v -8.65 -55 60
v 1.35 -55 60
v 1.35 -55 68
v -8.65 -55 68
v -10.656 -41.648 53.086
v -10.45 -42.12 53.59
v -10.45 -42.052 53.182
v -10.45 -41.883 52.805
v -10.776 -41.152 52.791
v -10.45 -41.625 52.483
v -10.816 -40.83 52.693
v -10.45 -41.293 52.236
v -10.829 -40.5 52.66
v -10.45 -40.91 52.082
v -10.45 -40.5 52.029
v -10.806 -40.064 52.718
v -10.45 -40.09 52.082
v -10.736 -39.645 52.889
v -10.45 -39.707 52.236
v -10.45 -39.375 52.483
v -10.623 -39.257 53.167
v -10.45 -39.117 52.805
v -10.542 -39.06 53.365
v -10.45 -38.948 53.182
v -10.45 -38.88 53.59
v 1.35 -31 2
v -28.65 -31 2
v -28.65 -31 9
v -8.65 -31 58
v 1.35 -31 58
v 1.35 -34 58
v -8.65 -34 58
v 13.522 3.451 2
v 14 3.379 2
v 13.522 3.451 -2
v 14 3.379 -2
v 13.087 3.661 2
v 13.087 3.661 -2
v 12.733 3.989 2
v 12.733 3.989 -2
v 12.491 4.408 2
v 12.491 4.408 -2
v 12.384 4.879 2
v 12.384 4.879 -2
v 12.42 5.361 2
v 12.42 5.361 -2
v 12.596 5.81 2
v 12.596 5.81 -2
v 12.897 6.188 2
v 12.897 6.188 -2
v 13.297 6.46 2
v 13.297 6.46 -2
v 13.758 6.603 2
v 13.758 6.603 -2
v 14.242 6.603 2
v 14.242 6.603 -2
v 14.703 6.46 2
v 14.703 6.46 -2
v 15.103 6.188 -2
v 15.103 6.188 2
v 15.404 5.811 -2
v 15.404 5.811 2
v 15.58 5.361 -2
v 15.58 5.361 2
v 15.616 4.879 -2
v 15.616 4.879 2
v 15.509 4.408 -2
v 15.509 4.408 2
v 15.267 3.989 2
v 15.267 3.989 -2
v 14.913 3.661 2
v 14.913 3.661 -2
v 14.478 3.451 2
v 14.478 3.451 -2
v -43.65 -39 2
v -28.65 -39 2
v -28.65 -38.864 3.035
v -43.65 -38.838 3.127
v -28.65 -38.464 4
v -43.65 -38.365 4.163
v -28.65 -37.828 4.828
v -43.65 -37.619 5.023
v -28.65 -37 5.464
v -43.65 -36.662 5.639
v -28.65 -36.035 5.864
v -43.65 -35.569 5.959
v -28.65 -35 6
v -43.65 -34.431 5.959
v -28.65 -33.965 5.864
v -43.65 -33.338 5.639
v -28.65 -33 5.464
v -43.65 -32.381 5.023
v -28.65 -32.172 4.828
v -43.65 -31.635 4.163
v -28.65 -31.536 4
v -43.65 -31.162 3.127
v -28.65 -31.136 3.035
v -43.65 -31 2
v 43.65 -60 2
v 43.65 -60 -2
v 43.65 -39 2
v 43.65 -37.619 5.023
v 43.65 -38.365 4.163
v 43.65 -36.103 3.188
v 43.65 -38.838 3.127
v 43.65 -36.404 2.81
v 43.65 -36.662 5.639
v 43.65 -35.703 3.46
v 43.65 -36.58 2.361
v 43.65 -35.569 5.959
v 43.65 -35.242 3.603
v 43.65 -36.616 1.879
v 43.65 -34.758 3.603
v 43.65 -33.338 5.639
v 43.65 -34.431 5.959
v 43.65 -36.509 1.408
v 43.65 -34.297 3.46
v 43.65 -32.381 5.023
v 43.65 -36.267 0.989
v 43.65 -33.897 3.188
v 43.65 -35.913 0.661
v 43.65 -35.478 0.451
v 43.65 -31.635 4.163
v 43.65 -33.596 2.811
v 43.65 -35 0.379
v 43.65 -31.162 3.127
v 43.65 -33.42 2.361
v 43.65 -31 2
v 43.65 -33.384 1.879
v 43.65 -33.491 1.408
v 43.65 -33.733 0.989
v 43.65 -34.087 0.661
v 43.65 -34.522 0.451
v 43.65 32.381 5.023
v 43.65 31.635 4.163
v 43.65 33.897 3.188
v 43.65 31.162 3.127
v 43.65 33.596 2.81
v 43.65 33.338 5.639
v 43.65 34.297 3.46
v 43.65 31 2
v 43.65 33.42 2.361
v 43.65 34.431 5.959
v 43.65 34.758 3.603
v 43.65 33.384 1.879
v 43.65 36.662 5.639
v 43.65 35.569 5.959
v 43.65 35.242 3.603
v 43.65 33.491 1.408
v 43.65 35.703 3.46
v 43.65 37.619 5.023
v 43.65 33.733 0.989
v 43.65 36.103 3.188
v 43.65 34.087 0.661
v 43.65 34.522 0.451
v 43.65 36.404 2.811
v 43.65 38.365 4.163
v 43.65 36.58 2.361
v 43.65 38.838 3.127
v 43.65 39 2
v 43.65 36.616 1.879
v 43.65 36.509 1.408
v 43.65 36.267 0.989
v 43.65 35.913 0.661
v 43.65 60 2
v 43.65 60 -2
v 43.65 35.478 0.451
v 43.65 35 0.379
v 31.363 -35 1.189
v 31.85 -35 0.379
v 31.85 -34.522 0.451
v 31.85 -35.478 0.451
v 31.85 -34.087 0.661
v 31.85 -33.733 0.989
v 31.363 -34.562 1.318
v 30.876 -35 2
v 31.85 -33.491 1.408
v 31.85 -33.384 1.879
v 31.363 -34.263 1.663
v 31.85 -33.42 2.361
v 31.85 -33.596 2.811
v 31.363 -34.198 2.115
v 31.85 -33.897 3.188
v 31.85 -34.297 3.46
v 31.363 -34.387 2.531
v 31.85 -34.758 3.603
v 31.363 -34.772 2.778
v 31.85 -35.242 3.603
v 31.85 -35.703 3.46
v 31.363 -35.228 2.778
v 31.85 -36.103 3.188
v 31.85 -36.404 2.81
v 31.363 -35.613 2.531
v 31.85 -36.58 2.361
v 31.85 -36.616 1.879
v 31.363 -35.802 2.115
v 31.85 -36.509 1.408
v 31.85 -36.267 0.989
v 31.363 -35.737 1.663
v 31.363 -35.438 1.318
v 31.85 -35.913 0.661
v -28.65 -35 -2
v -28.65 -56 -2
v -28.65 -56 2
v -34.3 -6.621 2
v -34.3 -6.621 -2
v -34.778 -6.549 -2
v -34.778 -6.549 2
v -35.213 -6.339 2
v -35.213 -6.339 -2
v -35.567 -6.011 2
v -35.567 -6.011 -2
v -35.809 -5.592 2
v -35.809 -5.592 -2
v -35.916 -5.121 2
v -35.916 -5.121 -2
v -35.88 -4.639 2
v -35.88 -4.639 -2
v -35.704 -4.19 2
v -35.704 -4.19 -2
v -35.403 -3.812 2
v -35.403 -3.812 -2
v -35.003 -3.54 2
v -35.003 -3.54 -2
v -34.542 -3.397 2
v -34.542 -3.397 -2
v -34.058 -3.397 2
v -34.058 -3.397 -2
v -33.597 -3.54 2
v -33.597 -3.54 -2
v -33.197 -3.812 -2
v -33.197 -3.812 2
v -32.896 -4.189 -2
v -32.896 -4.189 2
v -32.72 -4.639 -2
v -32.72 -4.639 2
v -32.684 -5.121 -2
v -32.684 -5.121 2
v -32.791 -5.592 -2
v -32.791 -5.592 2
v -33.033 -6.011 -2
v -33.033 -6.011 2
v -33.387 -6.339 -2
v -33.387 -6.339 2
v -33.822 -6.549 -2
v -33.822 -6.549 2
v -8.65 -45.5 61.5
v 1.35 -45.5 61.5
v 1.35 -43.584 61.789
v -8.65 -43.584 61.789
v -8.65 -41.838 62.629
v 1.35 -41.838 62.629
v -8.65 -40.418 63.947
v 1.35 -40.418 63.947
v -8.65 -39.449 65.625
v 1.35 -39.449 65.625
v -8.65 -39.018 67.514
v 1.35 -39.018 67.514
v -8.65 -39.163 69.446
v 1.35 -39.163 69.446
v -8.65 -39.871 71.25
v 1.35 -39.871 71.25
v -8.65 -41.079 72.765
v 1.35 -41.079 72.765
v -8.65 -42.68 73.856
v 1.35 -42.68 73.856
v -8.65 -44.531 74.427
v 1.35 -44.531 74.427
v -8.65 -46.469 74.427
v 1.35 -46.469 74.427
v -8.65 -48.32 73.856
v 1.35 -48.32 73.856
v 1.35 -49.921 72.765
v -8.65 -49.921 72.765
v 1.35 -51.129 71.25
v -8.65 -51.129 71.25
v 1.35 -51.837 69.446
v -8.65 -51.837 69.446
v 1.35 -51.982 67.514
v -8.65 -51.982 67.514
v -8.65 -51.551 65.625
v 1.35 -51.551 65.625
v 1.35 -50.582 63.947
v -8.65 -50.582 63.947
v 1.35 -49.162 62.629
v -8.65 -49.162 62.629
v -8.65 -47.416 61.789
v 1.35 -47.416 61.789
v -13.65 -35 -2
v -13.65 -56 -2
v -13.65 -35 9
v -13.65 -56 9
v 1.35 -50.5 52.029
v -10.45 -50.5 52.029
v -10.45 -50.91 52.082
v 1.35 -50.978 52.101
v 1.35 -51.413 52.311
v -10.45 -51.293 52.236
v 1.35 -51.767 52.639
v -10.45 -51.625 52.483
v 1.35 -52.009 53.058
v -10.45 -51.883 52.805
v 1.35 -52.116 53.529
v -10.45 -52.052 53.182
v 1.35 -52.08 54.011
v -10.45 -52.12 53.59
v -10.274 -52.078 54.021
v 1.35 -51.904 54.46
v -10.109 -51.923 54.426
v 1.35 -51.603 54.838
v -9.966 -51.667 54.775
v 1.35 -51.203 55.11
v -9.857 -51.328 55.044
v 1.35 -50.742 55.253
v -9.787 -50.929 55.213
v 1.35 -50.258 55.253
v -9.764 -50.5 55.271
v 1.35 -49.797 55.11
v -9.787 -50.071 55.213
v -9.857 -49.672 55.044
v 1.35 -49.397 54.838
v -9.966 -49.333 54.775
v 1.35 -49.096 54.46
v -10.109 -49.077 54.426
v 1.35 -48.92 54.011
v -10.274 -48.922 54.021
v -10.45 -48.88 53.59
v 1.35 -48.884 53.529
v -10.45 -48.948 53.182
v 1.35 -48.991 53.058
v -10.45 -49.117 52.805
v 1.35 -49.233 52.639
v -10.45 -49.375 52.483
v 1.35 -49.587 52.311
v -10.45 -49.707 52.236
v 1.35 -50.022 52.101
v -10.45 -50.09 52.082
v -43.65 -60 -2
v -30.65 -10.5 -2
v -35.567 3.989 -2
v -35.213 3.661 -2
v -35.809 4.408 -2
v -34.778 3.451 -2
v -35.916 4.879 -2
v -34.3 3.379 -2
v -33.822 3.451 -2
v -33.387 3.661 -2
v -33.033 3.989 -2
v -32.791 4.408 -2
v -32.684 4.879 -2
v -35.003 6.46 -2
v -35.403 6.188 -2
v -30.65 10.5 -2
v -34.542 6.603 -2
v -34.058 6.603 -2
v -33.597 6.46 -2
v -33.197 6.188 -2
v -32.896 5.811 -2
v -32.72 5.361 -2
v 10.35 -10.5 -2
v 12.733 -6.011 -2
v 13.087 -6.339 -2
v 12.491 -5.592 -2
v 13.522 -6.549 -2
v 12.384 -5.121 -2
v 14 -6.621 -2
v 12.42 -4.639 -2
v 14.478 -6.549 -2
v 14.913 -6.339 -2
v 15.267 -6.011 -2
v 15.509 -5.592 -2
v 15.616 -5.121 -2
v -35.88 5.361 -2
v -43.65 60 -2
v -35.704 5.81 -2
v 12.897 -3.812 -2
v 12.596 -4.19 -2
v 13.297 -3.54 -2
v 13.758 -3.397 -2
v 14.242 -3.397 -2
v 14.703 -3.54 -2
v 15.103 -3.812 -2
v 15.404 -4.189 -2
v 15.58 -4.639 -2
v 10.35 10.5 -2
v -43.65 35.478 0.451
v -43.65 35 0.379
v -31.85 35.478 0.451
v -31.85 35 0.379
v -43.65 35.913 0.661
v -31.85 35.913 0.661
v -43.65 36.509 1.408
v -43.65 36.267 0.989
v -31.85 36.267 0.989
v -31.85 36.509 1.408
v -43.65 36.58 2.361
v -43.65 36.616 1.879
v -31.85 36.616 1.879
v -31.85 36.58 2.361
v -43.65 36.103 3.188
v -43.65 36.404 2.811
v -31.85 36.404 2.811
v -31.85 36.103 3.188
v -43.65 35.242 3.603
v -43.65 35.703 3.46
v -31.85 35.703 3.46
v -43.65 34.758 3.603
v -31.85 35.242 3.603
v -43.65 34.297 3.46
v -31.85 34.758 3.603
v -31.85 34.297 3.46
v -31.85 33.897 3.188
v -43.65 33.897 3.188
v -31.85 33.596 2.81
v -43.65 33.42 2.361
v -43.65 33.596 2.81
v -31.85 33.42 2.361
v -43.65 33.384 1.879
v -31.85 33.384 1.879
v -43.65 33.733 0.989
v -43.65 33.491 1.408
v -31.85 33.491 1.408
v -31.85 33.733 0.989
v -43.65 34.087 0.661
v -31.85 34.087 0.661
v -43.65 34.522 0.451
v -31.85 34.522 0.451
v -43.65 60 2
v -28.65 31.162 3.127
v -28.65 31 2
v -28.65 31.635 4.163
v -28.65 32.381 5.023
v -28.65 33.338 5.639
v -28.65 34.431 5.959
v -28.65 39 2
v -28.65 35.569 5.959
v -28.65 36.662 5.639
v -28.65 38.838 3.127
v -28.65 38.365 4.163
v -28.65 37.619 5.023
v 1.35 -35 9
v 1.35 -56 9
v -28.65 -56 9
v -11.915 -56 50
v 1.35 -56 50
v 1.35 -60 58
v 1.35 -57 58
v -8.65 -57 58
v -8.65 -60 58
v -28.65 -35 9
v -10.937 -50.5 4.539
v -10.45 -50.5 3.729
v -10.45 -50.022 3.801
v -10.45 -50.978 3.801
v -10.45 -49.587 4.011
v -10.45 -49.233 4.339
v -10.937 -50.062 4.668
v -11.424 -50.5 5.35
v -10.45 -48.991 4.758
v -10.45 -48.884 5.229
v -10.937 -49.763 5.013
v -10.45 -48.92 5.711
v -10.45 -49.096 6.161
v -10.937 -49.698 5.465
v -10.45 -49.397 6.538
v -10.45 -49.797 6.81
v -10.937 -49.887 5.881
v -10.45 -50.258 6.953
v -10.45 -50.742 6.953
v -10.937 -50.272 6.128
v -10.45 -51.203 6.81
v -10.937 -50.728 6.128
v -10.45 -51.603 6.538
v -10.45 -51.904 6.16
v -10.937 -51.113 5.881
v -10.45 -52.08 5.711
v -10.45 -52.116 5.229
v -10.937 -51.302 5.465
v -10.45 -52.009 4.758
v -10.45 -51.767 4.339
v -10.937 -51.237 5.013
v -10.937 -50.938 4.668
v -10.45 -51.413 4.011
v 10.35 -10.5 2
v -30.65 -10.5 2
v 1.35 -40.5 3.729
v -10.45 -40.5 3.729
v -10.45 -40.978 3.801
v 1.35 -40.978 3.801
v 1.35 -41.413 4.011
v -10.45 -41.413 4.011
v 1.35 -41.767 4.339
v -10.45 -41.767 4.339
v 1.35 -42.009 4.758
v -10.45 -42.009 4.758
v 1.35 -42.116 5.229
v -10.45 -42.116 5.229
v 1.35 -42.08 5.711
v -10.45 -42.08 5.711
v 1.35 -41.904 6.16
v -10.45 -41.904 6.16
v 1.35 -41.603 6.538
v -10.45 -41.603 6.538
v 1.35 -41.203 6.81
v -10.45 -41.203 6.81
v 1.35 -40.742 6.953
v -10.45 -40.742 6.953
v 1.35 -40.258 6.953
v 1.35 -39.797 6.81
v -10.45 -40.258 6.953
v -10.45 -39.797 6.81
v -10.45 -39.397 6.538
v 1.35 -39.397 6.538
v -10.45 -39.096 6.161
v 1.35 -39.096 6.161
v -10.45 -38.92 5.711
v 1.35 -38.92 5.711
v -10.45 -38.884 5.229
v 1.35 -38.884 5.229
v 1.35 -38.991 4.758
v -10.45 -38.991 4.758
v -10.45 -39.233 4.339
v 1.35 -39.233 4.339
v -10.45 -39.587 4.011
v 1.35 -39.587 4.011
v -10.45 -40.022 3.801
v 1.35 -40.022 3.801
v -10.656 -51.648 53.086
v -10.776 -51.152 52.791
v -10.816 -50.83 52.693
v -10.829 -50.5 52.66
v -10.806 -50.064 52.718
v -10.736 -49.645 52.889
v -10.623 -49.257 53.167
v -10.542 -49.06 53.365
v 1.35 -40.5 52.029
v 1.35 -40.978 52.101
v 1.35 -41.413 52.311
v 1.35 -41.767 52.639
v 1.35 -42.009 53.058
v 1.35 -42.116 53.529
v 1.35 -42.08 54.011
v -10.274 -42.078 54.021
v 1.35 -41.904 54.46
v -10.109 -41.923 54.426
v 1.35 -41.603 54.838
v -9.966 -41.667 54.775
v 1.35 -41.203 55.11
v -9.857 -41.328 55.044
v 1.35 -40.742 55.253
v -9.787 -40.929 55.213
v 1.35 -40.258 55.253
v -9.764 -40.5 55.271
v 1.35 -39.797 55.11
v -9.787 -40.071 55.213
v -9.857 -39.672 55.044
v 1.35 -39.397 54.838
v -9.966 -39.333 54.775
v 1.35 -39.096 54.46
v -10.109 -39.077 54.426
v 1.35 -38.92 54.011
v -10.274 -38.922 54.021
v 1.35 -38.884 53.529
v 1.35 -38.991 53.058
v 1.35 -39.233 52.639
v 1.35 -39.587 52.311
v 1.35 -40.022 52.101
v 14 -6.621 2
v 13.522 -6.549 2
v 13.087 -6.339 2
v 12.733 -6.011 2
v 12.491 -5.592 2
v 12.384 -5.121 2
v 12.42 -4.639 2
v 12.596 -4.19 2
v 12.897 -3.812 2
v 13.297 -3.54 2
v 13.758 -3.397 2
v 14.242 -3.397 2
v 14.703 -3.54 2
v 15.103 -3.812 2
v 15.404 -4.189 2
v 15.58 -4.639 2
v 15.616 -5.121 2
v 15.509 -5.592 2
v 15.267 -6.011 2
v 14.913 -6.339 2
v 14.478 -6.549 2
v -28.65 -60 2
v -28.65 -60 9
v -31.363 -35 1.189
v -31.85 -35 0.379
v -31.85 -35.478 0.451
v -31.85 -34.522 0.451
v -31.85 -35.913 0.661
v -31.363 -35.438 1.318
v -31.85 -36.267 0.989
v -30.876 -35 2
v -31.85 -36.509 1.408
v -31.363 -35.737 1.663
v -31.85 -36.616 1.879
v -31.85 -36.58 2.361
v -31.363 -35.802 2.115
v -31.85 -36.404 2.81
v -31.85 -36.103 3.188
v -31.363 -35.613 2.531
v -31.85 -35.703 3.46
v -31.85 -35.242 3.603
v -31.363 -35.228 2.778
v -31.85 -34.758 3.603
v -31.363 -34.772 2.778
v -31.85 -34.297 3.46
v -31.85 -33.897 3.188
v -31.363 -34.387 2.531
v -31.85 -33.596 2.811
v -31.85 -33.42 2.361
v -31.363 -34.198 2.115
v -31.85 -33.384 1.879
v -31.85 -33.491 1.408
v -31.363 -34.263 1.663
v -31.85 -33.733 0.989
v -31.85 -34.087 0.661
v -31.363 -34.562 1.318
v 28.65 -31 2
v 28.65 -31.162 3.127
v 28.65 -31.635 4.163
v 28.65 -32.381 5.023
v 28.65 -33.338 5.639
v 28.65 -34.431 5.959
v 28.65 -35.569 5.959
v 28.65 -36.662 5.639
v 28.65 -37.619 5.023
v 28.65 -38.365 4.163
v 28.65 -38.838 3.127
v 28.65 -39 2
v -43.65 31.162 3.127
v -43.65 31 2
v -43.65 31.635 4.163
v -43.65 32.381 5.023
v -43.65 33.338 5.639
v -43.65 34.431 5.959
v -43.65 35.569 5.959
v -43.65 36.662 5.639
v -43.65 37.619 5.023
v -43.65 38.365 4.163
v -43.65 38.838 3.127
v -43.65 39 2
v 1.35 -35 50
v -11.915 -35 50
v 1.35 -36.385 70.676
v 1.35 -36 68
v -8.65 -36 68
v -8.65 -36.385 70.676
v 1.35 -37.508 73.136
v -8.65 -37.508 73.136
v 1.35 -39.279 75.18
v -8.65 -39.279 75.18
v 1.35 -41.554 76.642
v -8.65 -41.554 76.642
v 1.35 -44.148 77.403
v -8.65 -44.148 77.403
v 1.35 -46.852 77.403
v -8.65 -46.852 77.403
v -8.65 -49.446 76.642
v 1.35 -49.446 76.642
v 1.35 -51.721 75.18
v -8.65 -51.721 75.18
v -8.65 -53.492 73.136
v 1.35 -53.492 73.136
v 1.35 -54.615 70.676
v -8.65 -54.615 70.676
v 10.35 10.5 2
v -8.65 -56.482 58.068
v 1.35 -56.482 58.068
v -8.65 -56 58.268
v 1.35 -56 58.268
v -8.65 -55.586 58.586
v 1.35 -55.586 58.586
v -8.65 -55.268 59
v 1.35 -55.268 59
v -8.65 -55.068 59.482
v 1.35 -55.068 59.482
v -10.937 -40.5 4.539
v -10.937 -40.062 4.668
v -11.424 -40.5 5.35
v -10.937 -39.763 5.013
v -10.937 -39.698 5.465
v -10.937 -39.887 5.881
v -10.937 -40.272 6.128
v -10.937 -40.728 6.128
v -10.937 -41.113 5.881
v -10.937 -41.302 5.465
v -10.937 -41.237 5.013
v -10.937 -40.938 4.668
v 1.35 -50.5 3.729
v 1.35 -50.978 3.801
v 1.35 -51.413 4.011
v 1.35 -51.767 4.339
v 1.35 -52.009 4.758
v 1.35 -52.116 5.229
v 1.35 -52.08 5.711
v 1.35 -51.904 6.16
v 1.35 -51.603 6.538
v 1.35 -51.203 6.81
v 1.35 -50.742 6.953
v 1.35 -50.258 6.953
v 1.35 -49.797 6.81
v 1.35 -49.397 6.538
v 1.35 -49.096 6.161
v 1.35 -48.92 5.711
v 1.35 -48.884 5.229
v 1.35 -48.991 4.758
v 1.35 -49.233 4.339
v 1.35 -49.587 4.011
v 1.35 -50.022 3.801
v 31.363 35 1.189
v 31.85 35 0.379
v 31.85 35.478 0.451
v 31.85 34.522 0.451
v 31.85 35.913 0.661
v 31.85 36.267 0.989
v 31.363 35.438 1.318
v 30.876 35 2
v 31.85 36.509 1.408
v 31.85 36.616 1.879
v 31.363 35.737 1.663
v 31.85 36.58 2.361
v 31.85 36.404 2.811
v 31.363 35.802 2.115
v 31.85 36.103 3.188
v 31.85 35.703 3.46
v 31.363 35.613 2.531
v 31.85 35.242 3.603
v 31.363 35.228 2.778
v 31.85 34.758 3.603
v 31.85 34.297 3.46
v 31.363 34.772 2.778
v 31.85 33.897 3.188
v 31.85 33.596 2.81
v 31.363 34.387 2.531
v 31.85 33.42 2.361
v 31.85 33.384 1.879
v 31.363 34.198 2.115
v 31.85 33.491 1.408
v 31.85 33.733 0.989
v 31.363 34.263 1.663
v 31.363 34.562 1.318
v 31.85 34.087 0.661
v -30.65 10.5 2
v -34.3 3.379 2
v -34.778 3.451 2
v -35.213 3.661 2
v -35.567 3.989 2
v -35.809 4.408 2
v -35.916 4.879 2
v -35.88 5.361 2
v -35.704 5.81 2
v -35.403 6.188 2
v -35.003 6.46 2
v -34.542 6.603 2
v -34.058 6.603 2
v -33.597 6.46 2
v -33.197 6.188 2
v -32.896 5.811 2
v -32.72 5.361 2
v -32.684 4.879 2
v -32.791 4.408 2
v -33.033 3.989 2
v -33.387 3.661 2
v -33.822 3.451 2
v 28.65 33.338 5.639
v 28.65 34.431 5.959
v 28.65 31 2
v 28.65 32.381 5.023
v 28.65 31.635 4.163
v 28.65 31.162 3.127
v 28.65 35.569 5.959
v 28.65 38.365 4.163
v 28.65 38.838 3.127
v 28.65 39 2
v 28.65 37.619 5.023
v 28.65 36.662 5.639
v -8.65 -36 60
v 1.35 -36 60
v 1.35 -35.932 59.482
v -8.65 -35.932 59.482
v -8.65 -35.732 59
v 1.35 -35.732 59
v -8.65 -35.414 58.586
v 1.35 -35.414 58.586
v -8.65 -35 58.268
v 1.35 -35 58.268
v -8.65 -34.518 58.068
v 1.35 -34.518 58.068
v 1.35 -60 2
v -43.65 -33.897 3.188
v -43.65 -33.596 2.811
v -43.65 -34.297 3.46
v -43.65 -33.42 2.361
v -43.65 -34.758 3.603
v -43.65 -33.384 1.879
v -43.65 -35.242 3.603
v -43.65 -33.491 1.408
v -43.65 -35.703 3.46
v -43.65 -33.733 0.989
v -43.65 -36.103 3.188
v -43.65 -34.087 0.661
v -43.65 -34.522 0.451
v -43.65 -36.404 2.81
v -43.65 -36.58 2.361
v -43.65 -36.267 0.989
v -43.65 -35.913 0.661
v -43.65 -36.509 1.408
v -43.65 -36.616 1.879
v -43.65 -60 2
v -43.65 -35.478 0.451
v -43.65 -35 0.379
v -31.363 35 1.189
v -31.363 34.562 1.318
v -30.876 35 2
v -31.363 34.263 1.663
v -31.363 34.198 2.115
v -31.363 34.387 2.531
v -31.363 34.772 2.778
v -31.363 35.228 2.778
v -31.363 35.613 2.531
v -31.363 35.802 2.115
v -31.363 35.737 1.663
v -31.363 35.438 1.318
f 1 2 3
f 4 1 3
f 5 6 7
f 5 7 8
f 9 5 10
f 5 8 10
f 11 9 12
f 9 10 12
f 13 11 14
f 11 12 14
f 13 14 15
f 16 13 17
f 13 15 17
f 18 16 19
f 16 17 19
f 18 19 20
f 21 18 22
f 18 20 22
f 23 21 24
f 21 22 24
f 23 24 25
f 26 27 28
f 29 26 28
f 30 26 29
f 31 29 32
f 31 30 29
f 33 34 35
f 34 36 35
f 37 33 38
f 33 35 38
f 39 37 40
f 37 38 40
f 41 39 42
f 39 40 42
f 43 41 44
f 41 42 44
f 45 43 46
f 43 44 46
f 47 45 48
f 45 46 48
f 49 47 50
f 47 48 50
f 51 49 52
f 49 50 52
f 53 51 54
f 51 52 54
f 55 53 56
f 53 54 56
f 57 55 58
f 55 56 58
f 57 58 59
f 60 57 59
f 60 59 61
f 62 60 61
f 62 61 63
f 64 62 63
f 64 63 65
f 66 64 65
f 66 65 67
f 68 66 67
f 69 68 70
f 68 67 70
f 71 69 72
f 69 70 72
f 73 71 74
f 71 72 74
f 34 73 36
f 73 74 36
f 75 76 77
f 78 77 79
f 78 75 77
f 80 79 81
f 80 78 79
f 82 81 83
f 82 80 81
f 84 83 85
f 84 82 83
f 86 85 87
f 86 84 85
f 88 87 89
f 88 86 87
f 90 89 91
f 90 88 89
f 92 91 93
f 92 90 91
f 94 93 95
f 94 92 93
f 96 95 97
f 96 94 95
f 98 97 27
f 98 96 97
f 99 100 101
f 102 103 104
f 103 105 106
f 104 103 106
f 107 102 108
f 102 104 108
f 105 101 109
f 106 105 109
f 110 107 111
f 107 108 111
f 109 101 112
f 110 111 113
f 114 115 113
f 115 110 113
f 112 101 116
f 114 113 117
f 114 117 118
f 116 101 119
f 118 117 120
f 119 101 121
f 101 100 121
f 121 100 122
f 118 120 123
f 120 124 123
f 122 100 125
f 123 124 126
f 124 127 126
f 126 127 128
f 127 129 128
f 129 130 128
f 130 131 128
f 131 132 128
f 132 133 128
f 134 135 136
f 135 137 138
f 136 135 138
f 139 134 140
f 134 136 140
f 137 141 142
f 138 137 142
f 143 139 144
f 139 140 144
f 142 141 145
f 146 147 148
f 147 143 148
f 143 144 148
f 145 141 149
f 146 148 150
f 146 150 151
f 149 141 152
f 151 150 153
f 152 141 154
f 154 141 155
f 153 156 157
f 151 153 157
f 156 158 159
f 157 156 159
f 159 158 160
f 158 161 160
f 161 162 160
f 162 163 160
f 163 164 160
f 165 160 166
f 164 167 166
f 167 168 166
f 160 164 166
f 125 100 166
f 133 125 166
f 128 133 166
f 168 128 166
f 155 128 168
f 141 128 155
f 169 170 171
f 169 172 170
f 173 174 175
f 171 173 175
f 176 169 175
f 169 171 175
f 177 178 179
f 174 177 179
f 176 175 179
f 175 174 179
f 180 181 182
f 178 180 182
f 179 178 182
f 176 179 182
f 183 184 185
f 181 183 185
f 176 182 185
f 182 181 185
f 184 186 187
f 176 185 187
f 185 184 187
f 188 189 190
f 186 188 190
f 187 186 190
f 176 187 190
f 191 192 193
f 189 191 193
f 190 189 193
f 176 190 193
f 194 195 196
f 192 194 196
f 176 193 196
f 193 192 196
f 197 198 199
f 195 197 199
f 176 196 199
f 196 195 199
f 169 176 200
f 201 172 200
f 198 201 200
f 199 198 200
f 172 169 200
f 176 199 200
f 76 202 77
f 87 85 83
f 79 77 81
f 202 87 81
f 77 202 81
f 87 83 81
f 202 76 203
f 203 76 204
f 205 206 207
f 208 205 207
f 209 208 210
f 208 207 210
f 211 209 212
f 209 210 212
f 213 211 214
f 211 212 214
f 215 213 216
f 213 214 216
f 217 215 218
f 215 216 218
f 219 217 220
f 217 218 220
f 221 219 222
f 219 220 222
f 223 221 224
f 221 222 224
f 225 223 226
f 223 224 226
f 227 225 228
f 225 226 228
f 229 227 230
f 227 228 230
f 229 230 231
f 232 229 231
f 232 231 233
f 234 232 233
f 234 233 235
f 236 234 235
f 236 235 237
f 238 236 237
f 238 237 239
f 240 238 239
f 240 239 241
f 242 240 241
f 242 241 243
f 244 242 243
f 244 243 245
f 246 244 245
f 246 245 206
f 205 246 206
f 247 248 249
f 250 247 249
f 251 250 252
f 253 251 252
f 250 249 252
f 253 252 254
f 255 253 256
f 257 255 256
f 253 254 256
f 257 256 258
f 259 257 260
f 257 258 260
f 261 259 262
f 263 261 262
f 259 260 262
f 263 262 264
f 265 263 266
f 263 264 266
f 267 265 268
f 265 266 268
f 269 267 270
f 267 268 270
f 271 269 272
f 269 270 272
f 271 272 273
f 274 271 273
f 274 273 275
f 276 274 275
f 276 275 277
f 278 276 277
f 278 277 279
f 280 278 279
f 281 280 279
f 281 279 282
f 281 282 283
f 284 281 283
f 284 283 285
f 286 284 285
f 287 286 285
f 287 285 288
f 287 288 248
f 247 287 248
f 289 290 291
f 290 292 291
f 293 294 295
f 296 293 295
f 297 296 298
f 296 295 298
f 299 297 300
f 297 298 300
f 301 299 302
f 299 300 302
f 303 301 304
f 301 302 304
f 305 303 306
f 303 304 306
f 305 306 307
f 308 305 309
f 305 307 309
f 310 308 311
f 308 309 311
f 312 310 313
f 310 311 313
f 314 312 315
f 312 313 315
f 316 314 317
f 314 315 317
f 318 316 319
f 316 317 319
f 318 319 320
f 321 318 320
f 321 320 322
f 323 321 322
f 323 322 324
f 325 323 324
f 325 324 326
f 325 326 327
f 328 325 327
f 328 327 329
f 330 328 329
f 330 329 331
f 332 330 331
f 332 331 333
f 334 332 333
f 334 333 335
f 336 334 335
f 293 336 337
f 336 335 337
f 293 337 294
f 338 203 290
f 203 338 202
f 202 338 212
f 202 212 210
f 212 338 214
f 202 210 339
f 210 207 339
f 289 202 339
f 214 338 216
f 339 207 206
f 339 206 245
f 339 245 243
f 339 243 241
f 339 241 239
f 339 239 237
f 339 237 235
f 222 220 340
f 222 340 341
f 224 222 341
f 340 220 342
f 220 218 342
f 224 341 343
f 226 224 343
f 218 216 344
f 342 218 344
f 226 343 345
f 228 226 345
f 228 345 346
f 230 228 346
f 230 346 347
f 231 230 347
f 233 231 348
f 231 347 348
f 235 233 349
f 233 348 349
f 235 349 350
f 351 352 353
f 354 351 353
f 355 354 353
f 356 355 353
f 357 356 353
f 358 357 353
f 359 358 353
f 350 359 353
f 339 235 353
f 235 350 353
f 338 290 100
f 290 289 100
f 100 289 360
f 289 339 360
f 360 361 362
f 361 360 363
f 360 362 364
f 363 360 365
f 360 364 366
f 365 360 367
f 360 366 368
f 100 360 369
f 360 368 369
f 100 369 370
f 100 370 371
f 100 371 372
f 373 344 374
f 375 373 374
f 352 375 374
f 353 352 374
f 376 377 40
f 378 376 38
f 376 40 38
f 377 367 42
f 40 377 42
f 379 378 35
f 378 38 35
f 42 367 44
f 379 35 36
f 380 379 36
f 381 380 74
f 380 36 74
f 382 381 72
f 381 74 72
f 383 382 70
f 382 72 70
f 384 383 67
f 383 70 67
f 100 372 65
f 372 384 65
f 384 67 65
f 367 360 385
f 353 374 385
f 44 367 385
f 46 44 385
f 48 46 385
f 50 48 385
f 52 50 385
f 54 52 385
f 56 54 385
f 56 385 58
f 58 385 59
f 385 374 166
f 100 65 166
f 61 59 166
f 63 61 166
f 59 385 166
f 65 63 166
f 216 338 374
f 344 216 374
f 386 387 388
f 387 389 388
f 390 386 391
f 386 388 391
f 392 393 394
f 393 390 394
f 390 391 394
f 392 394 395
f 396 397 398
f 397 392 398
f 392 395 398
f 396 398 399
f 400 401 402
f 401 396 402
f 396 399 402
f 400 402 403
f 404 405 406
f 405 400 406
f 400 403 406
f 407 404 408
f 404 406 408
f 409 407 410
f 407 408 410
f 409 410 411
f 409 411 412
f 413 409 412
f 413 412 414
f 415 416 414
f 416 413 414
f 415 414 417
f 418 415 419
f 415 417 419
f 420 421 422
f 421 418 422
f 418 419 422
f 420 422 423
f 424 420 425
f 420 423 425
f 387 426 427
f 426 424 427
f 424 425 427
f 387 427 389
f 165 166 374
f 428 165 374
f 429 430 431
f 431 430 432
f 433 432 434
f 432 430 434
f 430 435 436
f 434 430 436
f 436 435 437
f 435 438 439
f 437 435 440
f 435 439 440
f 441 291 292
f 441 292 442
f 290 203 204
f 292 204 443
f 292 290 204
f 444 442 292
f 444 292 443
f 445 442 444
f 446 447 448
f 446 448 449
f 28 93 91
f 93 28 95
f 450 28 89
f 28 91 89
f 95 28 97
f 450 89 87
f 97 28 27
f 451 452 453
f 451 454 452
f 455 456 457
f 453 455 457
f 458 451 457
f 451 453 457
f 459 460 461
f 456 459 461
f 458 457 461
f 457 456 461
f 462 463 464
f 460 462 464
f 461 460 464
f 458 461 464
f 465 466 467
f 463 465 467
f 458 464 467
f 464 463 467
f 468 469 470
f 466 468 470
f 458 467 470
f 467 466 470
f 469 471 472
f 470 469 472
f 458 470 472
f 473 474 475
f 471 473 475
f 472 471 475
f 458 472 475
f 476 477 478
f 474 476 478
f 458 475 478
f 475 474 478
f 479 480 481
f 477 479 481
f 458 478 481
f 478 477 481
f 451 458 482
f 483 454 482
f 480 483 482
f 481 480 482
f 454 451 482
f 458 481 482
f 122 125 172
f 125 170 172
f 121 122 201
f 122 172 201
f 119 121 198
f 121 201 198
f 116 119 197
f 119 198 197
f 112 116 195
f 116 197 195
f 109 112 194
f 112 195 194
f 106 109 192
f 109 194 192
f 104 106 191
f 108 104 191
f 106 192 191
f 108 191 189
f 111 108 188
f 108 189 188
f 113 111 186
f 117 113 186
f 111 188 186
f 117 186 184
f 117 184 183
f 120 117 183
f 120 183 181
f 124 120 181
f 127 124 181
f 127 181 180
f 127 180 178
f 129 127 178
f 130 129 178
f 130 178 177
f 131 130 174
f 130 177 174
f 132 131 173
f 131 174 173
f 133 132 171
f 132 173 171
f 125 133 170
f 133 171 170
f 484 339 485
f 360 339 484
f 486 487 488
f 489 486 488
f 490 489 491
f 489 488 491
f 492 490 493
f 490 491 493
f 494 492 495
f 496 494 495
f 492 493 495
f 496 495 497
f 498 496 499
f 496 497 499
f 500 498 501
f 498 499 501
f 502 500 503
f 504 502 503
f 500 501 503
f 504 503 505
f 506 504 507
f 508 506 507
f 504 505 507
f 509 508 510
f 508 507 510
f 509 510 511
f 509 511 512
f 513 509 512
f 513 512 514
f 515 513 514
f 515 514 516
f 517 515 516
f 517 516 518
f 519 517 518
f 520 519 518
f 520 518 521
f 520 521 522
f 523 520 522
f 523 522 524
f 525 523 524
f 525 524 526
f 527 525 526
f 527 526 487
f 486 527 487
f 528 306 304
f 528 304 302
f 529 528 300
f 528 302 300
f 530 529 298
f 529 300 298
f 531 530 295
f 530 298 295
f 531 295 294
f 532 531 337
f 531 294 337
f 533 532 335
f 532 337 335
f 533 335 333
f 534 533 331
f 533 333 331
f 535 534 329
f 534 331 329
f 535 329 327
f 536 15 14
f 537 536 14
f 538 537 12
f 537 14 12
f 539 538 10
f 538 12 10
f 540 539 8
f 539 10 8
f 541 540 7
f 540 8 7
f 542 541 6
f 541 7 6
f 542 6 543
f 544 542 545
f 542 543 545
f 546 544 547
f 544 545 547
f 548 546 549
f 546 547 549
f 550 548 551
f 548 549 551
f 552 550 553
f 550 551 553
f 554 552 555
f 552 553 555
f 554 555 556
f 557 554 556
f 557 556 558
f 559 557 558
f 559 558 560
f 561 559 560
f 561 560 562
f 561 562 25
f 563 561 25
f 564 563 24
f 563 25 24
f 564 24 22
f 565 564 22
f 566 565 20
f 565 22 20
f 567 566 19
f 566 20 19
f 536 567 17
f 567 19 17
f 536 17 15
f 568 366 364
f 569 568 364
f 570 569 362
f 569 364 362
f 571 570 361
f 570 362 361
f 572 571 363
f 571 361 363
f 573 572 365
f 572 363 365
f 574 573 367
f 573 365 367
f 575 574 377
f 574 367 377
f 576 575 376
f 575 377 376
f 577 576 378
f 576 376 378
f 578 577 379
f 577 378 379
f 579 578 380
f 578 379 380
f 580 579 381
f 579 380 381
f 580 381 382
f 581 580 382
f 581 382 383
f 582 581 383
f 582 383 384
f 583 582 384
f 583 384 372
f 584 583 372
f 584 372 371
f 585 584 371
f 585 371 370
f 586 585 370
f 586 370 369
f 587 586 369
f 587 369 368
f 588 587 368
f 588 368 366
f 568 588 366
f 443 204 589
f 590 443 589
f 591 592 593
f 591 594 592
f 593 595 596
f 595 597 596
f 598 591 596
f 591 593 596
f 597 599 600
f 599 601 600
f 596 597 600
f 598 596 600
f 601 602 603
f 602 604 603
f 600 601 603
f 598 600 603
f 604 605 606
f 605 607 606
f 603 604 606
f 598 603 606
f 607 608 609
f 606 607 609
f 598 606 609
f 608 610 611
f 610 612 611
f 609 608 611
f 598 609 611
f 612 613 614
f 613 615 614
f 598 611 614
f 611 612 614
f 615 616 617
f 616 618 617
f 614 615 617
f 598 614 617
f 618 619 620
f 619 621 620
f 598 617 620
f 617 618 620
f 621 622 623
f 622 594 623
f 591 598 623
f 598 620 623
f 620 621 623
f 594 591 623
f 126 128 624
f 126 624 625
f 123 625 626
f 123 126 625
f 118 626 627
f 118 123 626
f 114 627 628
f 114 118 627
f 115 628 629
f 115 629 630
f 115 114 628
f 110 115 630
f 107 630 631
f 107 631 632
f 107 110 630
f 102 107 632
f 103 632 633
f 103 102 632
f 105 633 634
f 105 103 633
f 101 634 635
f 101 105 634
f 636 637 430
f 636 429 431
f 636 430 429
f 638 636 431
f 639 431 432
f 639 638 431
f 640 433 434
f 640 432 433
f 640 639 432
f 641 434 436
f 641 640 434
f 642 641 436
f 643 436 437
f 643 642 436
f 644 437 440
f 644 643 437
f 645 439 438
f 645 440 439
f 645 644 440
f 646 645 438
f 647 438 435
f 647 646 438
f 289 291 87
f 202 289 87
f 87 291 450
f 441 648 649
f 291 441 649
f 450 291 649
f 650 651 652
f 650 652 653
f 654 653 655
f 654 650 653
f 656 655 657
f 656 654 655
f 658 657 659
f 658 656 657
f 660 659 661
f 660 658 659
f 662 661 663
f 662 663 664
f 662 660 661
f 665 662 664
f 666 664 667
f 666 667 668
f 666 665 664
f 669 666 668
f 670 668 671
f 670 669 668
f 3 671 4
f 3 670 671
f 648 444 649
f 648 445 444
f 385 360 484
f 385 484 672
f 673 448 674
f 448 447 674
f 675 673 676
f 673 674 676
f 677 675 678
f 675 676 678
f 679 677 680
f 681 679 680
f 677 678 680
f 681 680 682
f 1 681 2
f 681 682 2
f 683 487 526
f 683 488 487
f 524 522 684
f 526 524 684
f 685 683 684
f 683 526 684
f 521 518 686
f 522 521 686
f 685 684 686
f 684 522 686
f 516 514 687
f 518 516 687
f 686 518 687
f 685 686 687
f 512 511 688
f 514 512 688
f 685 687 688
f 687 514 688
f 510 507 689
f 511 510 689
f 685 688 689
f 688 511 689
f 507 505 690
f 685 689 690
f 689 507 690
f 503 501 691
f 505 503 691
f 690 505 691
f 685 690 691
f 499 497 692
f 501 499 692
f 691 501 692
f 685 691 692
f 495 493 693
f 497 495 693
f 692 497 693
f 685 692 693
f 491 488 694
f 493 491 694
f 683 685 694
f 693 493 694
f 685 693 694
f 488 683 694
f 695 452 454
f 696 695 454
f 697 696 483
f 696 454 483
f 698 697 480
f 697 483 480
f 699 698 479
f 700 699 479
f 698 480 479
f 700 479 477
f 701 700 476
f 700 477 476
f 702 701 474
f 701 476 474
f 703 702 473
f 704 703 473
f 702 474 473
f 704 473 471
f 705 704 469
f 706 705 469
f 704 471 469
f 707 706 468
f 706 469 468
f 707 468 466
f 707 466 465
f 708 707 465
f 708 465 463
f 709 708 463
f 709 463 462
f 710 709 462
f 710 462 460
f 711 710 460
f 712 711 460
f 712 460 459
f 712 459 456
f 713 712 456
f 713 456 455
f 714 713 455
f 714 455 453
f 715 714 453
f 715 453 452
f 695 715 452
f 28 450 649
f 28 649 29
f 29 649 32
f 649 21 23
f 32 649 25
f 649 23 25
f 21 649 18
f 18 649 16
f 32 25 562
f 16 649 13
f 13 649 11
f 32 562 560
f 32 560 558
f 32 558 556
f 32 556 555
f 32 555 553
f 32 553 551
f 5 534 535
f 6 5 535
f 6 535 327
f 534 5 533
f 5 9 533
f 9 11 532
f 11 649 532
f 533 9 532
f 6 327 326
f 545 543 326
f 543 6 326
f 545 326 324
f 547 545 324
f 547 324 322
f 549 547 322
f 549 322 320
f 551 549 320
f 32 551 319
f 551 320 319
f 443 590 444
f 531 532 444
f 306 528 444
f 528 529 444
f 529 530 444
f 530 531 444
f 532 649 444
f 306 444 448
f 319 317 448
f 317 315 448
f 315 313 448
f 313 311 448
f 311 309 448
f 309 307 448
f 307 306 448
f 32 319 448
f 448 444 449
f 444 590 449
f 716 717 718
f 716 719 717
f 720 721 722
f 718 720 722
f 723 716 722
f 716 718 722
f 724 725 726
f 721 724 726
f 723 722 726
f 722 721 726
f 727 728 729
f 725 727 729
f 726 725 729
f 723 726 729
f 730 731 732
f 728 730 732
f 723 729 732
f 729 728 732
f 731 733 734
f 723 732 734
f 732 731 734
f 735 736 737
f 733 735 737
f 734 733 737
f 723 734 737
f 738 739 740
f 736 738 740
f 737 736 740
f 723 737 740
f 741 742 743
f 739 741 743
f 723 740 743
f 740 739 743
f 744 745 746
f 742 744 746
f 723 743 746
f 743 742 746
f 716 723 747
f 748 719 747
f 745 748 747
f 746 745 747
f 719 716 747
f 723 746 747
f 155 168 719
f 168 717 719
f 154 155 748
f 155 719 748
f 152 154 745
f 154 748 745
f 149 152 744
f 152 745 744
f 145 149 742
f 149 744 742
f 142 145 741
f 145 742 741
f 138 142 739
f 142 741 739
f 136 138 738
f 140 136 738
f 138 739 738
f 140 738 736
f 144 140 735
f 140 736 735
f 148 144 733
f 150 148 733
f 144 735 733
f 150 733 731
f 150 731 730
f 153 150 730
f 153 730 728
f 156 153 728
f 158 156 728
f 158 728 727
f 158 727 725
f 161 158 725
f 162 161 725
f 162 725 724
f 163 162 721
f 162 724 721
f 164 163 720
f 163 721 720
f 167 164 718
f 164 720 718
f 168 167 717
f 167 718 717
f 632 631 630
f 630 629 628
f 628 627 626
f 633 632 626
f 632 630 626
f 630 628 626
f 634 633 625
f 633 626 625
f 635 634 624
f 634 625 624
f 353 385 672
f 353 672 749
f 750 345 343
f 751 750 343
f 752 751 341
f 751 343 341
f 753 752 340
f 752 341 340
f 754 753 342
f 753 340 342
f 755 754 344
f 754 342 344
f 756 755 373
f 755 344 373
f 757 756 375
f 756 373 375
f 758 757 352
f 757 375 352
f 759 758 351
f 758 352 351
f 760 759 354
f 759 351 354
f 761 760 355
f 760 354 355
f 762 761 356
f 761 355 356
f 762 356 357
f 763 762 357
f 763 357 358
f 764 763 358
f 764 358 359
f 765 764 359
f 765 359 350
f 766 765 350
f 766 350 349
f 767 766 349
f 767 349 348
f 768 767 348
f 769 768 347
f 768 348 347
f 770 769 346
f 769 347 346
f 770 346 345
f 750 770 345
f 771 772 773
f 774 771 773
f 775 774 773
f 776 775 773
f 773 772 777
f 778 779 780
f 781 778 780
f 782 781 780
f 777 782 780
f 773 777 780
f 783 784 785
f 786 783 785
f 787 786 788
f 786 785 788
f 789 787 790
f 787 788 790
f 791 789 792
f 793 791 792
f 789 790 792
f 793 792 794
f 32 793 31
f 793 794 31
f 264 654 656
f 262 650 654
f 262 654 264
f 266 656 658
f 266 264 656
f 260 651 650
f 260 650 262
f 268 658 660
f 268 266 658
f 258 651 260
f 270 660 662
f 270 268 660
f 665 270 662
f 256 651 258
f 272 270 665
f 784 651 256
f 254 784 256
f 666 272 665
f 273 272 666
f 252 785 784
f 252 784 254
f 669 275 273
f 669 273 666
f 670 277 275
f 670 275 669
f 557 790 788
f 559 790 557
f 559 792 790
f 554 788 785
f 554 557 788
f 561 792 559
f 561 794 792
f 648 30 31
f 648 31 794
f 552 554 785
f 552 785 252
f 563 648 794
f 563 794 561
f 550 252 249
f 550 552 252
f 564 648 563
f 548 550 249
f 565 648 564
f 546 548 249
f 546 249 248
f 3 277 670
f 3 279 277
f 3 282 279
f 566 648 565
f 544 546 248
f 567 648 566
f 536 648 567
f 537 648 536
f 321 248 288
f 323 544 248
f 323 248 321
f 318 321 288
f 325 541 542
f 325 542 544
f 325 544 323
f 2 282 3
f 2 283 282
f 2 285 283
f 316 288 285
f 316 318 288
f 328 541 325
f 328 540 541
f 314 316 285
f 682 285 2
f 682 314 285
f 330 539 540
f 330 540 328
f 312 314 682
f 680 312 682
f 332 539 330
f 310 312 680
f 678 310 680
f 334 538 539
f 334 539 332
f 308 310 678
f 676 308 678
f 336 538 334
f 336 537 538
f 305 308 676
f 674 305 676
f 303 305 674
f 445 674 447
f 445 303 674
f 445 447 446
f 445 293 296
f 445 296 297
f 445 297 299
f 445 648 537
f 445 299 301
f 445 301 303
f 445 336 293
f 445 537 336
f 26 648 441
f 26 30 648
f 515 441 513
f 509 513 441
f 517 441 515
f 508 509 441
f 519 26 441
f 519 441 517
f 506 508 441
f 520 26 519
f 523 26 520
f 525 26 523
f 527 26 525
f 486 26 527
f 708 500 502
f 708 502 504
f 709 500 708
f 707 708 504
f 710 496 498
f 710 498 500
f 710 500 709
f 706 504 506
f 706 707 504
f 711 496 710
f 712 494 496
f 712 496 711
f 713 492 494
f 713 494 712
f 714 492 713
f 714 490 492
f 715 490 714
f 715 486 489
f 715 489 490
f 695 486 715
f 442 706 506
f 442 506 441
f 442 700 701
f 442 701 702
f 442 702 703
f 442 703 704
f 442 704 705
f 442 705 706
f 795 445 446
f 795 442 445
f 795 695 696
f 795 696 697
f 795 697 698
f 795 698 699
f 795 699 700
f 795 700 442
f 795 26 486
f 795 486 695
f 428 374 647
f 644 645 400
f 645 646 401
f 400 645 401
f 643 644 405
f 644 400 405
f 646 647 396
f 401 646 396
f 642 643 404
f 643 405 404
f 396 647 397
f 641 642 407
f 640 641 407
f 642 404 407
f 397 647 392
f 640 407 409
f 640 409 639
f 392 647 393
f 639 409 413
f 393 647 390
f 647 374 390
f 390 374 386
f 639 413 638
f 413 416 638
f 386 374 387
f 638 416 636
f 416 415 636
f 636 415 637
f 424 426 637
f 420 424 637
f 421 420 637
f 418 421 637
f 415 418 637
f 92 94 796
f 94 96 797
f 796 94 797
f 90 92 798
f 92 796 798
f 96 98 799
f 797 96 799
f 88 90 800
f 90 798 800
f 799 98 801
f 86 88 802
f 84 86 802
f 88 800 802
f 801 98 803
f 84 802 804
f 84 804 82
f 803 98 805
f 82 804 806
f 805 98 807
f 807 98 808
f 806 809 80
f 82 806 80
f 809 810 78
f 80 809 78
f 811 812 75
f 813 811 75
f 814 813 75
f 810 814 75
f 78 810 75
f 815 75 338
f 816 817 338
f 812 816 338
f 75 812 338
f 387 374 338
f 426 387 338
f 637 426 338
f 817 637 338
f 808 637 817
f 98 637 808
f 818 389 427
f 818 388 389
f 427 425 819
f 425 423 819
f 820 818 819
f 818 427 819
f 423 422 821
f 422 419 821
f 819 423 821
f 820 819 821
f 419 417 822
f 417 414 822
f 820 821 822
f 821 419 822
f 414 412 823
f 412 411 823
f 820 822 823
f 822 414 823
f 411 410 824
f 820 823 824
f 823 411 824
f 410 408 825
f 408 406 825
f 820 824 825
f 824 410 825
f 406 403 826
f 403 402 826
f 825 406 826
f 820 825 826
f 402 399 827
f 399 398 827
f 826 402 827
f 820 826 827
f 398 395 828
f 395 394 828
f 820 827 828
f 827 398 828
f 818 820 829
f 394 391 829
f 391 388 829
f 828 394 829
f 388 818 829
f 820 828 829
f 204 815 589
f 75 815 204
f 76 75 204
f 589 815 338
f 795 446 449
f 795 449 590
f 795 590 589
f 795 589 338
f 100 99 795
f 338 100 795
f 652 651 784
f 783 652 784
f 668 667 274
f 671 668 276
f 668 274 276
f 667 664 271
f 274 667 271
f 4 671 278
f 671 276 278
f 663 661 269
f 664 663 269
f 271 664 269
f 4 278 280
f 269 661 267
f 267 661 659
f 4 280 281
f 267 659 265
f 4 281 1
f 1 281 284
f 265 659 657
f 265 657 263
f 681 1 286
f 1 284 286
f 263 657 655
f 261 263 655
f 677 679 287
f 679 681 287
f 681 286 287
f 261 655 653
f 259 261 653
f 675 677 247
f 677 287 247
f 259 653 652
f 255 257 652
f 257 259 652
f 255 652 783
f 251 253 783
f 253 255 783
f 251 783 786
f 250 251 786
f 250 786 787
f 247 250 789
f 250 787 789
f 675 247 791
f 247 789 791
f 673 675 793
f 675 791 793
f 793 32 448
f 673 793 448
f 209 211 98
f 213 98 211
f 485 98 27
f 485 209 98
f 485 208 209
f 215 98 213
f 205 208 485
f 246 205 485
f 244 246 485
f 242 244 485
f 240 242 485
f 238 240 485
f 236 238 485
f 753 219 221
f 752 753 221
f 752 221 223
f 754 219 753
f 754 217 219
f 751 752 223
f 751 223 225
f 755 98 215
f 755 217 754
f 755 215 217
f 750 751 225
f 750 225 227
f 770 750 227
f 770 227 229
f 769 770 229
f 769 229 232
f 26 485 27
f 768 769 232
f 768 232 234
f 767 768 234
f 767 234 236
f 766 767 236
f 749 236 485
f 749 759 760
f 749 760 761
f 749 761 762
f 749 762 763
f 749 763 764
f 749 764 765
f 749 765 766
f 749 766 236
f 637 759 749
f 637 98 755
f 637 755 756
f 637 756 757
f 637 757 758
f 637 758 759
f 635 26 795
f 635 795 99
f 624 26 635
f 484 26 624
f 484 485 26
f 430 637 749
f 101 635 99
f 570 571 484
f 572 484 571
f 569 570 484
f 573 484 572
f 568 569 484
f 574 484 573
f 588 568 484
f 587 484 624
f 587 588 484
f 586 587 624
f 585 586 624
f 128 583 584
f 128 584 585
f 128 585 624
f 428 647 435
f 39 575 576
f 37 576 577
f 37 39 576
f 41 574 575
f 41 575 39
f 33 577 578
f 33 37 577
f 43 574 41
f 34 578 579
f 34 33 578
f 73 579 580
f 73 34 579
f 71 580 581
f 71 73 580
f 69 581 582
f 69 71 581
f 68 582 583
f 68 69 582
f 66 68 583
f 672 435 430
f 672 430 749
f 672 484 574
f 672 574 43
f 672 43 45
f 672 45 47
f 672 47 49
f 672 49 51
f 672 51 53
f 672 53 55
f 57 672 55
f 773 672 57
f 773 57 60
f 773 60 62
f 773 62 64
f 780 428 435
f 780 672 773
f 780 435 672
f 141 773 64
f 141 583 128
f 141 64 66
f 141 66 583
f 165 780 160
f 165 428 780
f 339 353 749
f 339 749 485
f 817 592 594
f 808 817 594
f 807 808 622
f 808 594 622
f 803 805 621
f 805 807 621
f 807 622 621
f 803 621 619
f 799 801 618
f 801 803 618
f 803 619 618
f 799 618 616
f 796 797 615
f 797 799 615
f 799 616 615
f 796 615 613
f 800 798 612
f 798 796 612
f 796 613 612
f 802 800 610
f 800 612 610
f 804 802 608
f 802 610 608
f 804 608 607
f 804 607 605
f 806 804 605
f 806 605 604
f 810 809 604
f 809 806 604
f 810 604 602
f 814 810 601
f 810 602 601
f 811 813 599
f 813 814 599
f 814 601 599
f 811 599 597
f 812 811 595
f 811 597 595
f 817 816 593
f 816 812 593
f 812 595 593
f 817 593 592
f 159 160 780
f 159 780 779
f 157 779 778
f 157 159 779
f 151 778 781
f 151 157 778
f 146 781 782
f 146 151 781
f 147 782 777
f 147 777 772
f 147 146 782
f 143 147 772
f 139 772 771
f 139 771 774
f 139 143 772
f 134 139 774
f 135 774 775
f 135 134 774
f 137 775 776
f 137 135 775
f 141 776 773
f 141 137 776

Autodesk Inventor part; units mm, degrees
ref_plane "YZ Plane" through (0, 0, 0) normal (1, 0, 0) x (0, 1, 0)
ref_plane "XZ Plane" through (0, 0, 0) normal (0, 1, 0) x (-1, 0, 0)
ref_plane "XY Plane" through (0, 0, 0) normal (0, 0, 1) x (1, 0, 0)
sketch "Sketch1" plane through (0, 0, 0) normal (0, 0, 1) x (1, 0, 0)
  line L0 (-30.65, -10.5) -> (10.35, -10.5)
  line L1 (10.35, -10.5) -> (10.35, 10.5)
  line L2 (10.35, 10.5) -> (-30.65, 10.5)
  line L3 (-30.65, 10.5) -> (-30.65, -10.5)
  line L4 (-30.65, -10.5) -> (10.35, 10.5) construction
  line L5 (10.35, -10.5) -> (-30.65, 10.5) construction
  line L6 (-43.65, -60) -> (43.65, -60)
  line L7 (43.65, -60) -> (43.65, 60)
  line L8 (43.65, 60) -> (-43.65, 60)
  line L9 (-43.65, 60) -> (-43.65, -60)
  line L10 (-43.65, -60) -> (43.65, 60) construction
  line L11 (43.65, -60) -> (-43.65, 60) construction
  point P0 (-10.15, 0)
  point P1 (0, 0)
  point P2 (-10.15, 0)
  point P3 (0, 0)
  dimension "d0" = 41
  dimension "d1" = 21
  dimension "d2" = 87.3
  dimension "d3" = 120
  dimension "d4" = 10.15
extrude "Extrusion1" add sketch "Sketch1" along normal mid plane 4
sketch "Sketch2" plane through (0, 0, 2) normal (0, 0, 1) x (1, 0, 0)
  line L0 (14, -5) -> (-34.3, -5) construction
  line L1 (-34.3, -5) -> (-34.3, 5) construction
  line L2 (-34.3, 5) -> (14, 5) construction
  line L3 (14, 5) -> (14, -5) construction
  line L4 (14, -5) -> (-34.3, 5) construction
  line L5 (-34.3, -5) -> (14, 5) construction
  point P0 (0, 0)
  point P1 (-10.15, 0)
  point P2 (-10.15, 0)
  dimension "d7" = 48.3
  dimension "d8" = 10
  dimension "d9" = 14
hole "Hole1" at (-34.3, 5, 2) at (-34.3, -5, 2) at (14, -5, 2) at (14, 5, 2) direction (0, 0, -1) diameter 3.242 end through all thread size "M4x0.7" class "6H" standard "ANSI Metric M Profile"
sketch "Sketch3" plane through (43.65, -60, 2) normal (1, 0, 0) x (0, 0, -1)
  line L0 (4, 120) -> (0, 120) projected
  line L1 (0, 0) -> (0, 120) projected
  line L2 (4, 0) -> (0, 0) projected
  line L3 (4, 120) -> (4, 0) projected
  line L4 (0, 0) -> (0, 120) projected
  arc A0 (0, 29) -> (0, 21) centre (0, 25) ccw
  arc A1 (0, 99) -> (0, 91) centre (0, 95) ccw
  line L5 (0, 95) -> (0, 25) construction
  point P0 (2, 60)
  point P1 (0, 60)
  dimension "d17" = 70
extrude "Extrusion2" add sketch "Sketch3" against normal blind 15 contours L1 A1 | A0 L1
sketch "Sketch4" plane through (43.65, -60, -2) normal (1, 0, 0) x (0, 0, -1)
  line L0 (0, 120) -> (-4, 120) projected
  line L1 (-4, 99) -> (-4, 120) projected
  arc A0 (-4, 99) -> (-4, 91) centre (-4, 95) ccw projected
  line L2 (-4, 29) -> (-4, 91) projected
  arc A1 (-4, 29) -> (-4, 21) centre (-4, 25) ccw projected
  line L3 (-4, 0) -> (-4, 21) projected
  line L4 (0, 0) -> (-4, 0) projected
  line L5 (0, 120) -> (0, 0) projected
  point P0 (-2, 60)
hole "Hole2" at (43.65, 35, 2) at (43.65, -35, 2) direction (-1, 0, 0) diameter 3.242 depth 11.8 tip angle 118 thread size "M4x0.7" class "6H" standard "ANSI Metric M Profile"
mirror "Mirror1" about plane through (0, 0, 0) normal (1, 0, 0) of "Extrusion2", "Hole2"
sketch "Sketch5" plane through (0, 0, 2) normal (0, 0, 1) x (1, 0, 0)
  circle A0 centre (14, -5) radius 1.621 projected
  circle A1 centre (-34.3, 5) radius 1.621 projected
  circle A2 centre (-34.3, -5) radius 1.621 projected
  circle A3 centre (14, 5) radius 1.621 projected
  line L0 (-30.65, -10.5) -> (-30.65, 10.5) projected
  line L1 (-30.65, 10.5) -> (10.35, 10.5) projected
  line L2 (10.35, 10.5) -> (10.35, -10.5) projected
  line L3 (10.35, -10.5) -> (-30.65, -10.5) projected
  line L4 (-43.65, -31) -> (-28.65, -31) projected
  line L5 (-28.65, -31) -> (-28.65, -39) projected
  line L6 (-28.65, -39) -> (-43.65, -39) projected
  line L7 (-43.65, -39) -> (-43.65, -60) projected
  line L8 (-43.65, -60) -> (43.65, -60) projected
  line L9 (43.65, -60) -> (43.65, -39) projected
  line L10 (43.65, -39) -> (28.65, -39) projected
  line L11 (28.65, -39) -> (28.65, -31) projected
  line L12 (28.65, -31) -> (43.65, -31) projected
  line L13 (43.65, -31) -> (43.65, 31) projected
  line L14 (43.65, 31) -> (28.65, 31) projected
  line L15 (28.65, 31) -> (28.65, 39) projected
  line L16 (28.65, 39) -> (43.65, 39) projected
  line L17 (43.65, 39) -> (43.65, 60) projected
  line L18 (43.65, 60) -> (-43.65, 60) projected
  line L19 (-43.65, 60) -> (-43.65, 39) projected
  line L20 (-43.65, 39) -> (-28.65, 39) projected
  line L21 (-28.65, 39) -> (-28.65, 31) projected
  line L22 (-28.65, 31) -> (-43.65, 31) projected
  line L23 (-43.65, 31) -> (-43.65, -31) projected
  line L24 (-28.65, -35) -> (1.35, -35)
  line L25 (1.35, -35) -> (1.35, -56)
  line L26 (1.35, -56) -> (-28.65, -56)
  line L27 (-28.65, -56) -> (-28.65, -35)
  line L28 (-28.65, -31) -> (-28.65, -39) projected
  line L29 (10.35, 10.5) -> (10.35, -10.5) projected
  point P0 (0, 0)
  dimension "d27" = 45
  dimension "d28" = 4
extrude "Extrusion3" add sketch "Sketch5" along normal blind 7 contours L24 L25 L26 L27 L5
sketch "Sketch6" plane through (1.35, -56, 2) normal (1, 0, 0) x (0, 0, -1)
  line L0 (0, 21) -> (0, 0) projected
  line L1 (0, 21) -> (-7, 21) projected
  line L2 (-7, 0) -> (-7, 21) projected
  line L3 (0, 0) -> (-7, 0) projected
  line L4 (-56, -4) -> (0, -4)
  line L5 (0, -4) -> (0, 25)
  line L6 (0, 25) -> (-56, 25)
  line L7 (-56, 25) -> (-56, -4)
  line L8 (-7, 0) -> (-48, 0)
  line L9 (-48, 0) -> (-48, 21)
  line L10 (-48, 21) -> (-7, 21)
  line L11 (-7, 21) -> (-7, 0)
  line L12 (0, 25) -> (0, 87) projected
  line L13 (0, -4) -> (4, -4) projected
  point P0 (2, 56)
  point P1 (0, 10.5)
  dimension "d31" = 41
  dimension "d32" = 8
extrude "Extrusion4" add sketch "Sketch6" against normal up to surface (30 mm away) contours L0 L3 L2 L1 | L1 L10 L9 L8 L3 L5 L4 L7 L6
sketch "Sketch8" plane through (1.35, -60, 58) normal (1, 0, 0) x (0, 0, -1)
  line L0 (56, 29) -> (56, 0) projected
  line L1 (4.35, 9.5) -> (52.65, 9.5) construction
  line L2 (52.65, 9.5) -> (52.65, 19.5) construction
  line L3 (52.65, 19.5) -> (4.35, 19.5) construction
  line L4 (4.35, 19.5) -> (4.35, 9.5) construction
  line L5 (56, 29) -> (0, 29) projected
  line L6 (0, 29) -> (0, 0) projected
  line L7 (0, 0) -> (56, 0) projected
  point P0 (58, 60)
  point P1 (4.35, 14.5)
  point P2 (8, 14.5)
  point P3 (28.5, 19.5)
  point P4 (28.5, 25)
  dimension "d38" = 48.3
  dimension "d39" = 10
hole "Hole3" at (1.35, -50.5, 53.65) at (1.35, -40.5, 53.65) at (1.35, -40.5, 5.35) at (1.35, -50.5, 5.35) direction (-1, 0, 0) diameter 3.242 depth 11.8 tip angle 118 thread size "M4x0.7" class "6H" standard "ANSI Metric M Profile"
sketch "Sketch9" plane through (-43.65, -60, -2) normal (0, -1, 0) x (1, 0, 0)
  line L0 (87.3, 0) -> (87.3, 4) projected
  line L1 (45, 4) -> (87.3, 4) projected
  line L2 (45, 60) -> (45, 4) projected
  line L3 (45, 60) -> (15, 60) projected
  line L4 (15, 60) -> (15, 4) projected
  line L5 (0, 4) -> (15, 4) projected
  line L6 (0, 4) -> (0, 0) projected
  line L7 (87.3, 0) -> (0, 0) projected
  line L8 (15, 11) -> (45, 11) projected
  line L9 (15, 11) -> (35, 60)
  point P0 (43.65, 2)
  dimension "d47" = 10
extrude "Extrusion6" cut sketch "Sketch9" against normal through all contours L4 L3 L9
sketch "Sketch10" plane through (1.35, -60, 58) normal (1, 0, 0) x (0, 0, -1)
  circle A0 centre (52.65, 19.5) radius 1.621 projected
  circle A1 centre (4.35, 9.5) radius 1.621 projected
  circle A2 centre (4.35, 19.5) radius 1.621 projected
  circle A3 centre (52.65, 9.5) radius 1.621 projected
  line L0 (56, 29) -> (56, 0) projected
  line L1 (56, 29) -> (0, 29) projected
  line L2 (0, 29) -> (0, 0) projected
  line L3 (0, 0) -> (56, 0) projected
  line L4 (49, 4) -> (8, 4) projected
  line L5 (8, 4) -> (8, 25) projected
  line L6 (8, 25) -> (49, 25) projected
  line L7 (49, 4) -> (49, 25) projected
  circle A4 centre (-10, 14.5) radius 6.5
  arc A5 (0, 3) -> (-2, 5) centre (-2, 3) ccw
  line L8 (0, 29) -> (0, 0) projected
  arc A6 (-2, 24) -> (0, 26) centre (-2, 26) ccw
  line L9 (-2, 5) -> (-10, 5)
  arc A7 (-10, 24) -> (-10, 5) centre (-10, 14.5) ccw
  line L10 (-10, 24) -> (-2, 24)
  point P0 (58, 60)
  point P1 (0, 14.5)
  dimension "d50" = 13
  dimension "d51" = 10
  dimension "d52" = 3
  dimension "d53" = 2
extrude "Extrusion7" add sketch "Sketch10" against normal blind 10 contours L2 A5 L9 A7 L10 A6
sketch "Sketch11" plane through (0, 0, 9) normal (0, 0, 1) x (1, 0, 0)
  line L0 (1.35, -35) -> (-28.65, -35) projected
  line L1 (-28.65, -35) -> (-28.65, -56) projected
  line L2 (-28.65, -56) -> (1.35, -56) projected
  line L3 (1.35, -56) -> (1.35, -35) projected
  line L4 (1.35, -35) -> (-28.65, -35) projected
  line L5 (-28.65, -56) -> (-13.65, -56)
  line L6 (-13.65, -56) -> (-13.65, -35)
  line L7 (-13.65, -35) -> (-28.65, -35)
  line L8 (-28.65, -35) -> (-28.65, -56)
  point P0 (0, 0)
  dimension "d56" = 15
extrude "Extrusion8" cut sketch "Sketch11" against normal through all contours L6 L2 L1 L0
properties part number "Ground_Tracker_ServoMount" material "ABS Plastic"
